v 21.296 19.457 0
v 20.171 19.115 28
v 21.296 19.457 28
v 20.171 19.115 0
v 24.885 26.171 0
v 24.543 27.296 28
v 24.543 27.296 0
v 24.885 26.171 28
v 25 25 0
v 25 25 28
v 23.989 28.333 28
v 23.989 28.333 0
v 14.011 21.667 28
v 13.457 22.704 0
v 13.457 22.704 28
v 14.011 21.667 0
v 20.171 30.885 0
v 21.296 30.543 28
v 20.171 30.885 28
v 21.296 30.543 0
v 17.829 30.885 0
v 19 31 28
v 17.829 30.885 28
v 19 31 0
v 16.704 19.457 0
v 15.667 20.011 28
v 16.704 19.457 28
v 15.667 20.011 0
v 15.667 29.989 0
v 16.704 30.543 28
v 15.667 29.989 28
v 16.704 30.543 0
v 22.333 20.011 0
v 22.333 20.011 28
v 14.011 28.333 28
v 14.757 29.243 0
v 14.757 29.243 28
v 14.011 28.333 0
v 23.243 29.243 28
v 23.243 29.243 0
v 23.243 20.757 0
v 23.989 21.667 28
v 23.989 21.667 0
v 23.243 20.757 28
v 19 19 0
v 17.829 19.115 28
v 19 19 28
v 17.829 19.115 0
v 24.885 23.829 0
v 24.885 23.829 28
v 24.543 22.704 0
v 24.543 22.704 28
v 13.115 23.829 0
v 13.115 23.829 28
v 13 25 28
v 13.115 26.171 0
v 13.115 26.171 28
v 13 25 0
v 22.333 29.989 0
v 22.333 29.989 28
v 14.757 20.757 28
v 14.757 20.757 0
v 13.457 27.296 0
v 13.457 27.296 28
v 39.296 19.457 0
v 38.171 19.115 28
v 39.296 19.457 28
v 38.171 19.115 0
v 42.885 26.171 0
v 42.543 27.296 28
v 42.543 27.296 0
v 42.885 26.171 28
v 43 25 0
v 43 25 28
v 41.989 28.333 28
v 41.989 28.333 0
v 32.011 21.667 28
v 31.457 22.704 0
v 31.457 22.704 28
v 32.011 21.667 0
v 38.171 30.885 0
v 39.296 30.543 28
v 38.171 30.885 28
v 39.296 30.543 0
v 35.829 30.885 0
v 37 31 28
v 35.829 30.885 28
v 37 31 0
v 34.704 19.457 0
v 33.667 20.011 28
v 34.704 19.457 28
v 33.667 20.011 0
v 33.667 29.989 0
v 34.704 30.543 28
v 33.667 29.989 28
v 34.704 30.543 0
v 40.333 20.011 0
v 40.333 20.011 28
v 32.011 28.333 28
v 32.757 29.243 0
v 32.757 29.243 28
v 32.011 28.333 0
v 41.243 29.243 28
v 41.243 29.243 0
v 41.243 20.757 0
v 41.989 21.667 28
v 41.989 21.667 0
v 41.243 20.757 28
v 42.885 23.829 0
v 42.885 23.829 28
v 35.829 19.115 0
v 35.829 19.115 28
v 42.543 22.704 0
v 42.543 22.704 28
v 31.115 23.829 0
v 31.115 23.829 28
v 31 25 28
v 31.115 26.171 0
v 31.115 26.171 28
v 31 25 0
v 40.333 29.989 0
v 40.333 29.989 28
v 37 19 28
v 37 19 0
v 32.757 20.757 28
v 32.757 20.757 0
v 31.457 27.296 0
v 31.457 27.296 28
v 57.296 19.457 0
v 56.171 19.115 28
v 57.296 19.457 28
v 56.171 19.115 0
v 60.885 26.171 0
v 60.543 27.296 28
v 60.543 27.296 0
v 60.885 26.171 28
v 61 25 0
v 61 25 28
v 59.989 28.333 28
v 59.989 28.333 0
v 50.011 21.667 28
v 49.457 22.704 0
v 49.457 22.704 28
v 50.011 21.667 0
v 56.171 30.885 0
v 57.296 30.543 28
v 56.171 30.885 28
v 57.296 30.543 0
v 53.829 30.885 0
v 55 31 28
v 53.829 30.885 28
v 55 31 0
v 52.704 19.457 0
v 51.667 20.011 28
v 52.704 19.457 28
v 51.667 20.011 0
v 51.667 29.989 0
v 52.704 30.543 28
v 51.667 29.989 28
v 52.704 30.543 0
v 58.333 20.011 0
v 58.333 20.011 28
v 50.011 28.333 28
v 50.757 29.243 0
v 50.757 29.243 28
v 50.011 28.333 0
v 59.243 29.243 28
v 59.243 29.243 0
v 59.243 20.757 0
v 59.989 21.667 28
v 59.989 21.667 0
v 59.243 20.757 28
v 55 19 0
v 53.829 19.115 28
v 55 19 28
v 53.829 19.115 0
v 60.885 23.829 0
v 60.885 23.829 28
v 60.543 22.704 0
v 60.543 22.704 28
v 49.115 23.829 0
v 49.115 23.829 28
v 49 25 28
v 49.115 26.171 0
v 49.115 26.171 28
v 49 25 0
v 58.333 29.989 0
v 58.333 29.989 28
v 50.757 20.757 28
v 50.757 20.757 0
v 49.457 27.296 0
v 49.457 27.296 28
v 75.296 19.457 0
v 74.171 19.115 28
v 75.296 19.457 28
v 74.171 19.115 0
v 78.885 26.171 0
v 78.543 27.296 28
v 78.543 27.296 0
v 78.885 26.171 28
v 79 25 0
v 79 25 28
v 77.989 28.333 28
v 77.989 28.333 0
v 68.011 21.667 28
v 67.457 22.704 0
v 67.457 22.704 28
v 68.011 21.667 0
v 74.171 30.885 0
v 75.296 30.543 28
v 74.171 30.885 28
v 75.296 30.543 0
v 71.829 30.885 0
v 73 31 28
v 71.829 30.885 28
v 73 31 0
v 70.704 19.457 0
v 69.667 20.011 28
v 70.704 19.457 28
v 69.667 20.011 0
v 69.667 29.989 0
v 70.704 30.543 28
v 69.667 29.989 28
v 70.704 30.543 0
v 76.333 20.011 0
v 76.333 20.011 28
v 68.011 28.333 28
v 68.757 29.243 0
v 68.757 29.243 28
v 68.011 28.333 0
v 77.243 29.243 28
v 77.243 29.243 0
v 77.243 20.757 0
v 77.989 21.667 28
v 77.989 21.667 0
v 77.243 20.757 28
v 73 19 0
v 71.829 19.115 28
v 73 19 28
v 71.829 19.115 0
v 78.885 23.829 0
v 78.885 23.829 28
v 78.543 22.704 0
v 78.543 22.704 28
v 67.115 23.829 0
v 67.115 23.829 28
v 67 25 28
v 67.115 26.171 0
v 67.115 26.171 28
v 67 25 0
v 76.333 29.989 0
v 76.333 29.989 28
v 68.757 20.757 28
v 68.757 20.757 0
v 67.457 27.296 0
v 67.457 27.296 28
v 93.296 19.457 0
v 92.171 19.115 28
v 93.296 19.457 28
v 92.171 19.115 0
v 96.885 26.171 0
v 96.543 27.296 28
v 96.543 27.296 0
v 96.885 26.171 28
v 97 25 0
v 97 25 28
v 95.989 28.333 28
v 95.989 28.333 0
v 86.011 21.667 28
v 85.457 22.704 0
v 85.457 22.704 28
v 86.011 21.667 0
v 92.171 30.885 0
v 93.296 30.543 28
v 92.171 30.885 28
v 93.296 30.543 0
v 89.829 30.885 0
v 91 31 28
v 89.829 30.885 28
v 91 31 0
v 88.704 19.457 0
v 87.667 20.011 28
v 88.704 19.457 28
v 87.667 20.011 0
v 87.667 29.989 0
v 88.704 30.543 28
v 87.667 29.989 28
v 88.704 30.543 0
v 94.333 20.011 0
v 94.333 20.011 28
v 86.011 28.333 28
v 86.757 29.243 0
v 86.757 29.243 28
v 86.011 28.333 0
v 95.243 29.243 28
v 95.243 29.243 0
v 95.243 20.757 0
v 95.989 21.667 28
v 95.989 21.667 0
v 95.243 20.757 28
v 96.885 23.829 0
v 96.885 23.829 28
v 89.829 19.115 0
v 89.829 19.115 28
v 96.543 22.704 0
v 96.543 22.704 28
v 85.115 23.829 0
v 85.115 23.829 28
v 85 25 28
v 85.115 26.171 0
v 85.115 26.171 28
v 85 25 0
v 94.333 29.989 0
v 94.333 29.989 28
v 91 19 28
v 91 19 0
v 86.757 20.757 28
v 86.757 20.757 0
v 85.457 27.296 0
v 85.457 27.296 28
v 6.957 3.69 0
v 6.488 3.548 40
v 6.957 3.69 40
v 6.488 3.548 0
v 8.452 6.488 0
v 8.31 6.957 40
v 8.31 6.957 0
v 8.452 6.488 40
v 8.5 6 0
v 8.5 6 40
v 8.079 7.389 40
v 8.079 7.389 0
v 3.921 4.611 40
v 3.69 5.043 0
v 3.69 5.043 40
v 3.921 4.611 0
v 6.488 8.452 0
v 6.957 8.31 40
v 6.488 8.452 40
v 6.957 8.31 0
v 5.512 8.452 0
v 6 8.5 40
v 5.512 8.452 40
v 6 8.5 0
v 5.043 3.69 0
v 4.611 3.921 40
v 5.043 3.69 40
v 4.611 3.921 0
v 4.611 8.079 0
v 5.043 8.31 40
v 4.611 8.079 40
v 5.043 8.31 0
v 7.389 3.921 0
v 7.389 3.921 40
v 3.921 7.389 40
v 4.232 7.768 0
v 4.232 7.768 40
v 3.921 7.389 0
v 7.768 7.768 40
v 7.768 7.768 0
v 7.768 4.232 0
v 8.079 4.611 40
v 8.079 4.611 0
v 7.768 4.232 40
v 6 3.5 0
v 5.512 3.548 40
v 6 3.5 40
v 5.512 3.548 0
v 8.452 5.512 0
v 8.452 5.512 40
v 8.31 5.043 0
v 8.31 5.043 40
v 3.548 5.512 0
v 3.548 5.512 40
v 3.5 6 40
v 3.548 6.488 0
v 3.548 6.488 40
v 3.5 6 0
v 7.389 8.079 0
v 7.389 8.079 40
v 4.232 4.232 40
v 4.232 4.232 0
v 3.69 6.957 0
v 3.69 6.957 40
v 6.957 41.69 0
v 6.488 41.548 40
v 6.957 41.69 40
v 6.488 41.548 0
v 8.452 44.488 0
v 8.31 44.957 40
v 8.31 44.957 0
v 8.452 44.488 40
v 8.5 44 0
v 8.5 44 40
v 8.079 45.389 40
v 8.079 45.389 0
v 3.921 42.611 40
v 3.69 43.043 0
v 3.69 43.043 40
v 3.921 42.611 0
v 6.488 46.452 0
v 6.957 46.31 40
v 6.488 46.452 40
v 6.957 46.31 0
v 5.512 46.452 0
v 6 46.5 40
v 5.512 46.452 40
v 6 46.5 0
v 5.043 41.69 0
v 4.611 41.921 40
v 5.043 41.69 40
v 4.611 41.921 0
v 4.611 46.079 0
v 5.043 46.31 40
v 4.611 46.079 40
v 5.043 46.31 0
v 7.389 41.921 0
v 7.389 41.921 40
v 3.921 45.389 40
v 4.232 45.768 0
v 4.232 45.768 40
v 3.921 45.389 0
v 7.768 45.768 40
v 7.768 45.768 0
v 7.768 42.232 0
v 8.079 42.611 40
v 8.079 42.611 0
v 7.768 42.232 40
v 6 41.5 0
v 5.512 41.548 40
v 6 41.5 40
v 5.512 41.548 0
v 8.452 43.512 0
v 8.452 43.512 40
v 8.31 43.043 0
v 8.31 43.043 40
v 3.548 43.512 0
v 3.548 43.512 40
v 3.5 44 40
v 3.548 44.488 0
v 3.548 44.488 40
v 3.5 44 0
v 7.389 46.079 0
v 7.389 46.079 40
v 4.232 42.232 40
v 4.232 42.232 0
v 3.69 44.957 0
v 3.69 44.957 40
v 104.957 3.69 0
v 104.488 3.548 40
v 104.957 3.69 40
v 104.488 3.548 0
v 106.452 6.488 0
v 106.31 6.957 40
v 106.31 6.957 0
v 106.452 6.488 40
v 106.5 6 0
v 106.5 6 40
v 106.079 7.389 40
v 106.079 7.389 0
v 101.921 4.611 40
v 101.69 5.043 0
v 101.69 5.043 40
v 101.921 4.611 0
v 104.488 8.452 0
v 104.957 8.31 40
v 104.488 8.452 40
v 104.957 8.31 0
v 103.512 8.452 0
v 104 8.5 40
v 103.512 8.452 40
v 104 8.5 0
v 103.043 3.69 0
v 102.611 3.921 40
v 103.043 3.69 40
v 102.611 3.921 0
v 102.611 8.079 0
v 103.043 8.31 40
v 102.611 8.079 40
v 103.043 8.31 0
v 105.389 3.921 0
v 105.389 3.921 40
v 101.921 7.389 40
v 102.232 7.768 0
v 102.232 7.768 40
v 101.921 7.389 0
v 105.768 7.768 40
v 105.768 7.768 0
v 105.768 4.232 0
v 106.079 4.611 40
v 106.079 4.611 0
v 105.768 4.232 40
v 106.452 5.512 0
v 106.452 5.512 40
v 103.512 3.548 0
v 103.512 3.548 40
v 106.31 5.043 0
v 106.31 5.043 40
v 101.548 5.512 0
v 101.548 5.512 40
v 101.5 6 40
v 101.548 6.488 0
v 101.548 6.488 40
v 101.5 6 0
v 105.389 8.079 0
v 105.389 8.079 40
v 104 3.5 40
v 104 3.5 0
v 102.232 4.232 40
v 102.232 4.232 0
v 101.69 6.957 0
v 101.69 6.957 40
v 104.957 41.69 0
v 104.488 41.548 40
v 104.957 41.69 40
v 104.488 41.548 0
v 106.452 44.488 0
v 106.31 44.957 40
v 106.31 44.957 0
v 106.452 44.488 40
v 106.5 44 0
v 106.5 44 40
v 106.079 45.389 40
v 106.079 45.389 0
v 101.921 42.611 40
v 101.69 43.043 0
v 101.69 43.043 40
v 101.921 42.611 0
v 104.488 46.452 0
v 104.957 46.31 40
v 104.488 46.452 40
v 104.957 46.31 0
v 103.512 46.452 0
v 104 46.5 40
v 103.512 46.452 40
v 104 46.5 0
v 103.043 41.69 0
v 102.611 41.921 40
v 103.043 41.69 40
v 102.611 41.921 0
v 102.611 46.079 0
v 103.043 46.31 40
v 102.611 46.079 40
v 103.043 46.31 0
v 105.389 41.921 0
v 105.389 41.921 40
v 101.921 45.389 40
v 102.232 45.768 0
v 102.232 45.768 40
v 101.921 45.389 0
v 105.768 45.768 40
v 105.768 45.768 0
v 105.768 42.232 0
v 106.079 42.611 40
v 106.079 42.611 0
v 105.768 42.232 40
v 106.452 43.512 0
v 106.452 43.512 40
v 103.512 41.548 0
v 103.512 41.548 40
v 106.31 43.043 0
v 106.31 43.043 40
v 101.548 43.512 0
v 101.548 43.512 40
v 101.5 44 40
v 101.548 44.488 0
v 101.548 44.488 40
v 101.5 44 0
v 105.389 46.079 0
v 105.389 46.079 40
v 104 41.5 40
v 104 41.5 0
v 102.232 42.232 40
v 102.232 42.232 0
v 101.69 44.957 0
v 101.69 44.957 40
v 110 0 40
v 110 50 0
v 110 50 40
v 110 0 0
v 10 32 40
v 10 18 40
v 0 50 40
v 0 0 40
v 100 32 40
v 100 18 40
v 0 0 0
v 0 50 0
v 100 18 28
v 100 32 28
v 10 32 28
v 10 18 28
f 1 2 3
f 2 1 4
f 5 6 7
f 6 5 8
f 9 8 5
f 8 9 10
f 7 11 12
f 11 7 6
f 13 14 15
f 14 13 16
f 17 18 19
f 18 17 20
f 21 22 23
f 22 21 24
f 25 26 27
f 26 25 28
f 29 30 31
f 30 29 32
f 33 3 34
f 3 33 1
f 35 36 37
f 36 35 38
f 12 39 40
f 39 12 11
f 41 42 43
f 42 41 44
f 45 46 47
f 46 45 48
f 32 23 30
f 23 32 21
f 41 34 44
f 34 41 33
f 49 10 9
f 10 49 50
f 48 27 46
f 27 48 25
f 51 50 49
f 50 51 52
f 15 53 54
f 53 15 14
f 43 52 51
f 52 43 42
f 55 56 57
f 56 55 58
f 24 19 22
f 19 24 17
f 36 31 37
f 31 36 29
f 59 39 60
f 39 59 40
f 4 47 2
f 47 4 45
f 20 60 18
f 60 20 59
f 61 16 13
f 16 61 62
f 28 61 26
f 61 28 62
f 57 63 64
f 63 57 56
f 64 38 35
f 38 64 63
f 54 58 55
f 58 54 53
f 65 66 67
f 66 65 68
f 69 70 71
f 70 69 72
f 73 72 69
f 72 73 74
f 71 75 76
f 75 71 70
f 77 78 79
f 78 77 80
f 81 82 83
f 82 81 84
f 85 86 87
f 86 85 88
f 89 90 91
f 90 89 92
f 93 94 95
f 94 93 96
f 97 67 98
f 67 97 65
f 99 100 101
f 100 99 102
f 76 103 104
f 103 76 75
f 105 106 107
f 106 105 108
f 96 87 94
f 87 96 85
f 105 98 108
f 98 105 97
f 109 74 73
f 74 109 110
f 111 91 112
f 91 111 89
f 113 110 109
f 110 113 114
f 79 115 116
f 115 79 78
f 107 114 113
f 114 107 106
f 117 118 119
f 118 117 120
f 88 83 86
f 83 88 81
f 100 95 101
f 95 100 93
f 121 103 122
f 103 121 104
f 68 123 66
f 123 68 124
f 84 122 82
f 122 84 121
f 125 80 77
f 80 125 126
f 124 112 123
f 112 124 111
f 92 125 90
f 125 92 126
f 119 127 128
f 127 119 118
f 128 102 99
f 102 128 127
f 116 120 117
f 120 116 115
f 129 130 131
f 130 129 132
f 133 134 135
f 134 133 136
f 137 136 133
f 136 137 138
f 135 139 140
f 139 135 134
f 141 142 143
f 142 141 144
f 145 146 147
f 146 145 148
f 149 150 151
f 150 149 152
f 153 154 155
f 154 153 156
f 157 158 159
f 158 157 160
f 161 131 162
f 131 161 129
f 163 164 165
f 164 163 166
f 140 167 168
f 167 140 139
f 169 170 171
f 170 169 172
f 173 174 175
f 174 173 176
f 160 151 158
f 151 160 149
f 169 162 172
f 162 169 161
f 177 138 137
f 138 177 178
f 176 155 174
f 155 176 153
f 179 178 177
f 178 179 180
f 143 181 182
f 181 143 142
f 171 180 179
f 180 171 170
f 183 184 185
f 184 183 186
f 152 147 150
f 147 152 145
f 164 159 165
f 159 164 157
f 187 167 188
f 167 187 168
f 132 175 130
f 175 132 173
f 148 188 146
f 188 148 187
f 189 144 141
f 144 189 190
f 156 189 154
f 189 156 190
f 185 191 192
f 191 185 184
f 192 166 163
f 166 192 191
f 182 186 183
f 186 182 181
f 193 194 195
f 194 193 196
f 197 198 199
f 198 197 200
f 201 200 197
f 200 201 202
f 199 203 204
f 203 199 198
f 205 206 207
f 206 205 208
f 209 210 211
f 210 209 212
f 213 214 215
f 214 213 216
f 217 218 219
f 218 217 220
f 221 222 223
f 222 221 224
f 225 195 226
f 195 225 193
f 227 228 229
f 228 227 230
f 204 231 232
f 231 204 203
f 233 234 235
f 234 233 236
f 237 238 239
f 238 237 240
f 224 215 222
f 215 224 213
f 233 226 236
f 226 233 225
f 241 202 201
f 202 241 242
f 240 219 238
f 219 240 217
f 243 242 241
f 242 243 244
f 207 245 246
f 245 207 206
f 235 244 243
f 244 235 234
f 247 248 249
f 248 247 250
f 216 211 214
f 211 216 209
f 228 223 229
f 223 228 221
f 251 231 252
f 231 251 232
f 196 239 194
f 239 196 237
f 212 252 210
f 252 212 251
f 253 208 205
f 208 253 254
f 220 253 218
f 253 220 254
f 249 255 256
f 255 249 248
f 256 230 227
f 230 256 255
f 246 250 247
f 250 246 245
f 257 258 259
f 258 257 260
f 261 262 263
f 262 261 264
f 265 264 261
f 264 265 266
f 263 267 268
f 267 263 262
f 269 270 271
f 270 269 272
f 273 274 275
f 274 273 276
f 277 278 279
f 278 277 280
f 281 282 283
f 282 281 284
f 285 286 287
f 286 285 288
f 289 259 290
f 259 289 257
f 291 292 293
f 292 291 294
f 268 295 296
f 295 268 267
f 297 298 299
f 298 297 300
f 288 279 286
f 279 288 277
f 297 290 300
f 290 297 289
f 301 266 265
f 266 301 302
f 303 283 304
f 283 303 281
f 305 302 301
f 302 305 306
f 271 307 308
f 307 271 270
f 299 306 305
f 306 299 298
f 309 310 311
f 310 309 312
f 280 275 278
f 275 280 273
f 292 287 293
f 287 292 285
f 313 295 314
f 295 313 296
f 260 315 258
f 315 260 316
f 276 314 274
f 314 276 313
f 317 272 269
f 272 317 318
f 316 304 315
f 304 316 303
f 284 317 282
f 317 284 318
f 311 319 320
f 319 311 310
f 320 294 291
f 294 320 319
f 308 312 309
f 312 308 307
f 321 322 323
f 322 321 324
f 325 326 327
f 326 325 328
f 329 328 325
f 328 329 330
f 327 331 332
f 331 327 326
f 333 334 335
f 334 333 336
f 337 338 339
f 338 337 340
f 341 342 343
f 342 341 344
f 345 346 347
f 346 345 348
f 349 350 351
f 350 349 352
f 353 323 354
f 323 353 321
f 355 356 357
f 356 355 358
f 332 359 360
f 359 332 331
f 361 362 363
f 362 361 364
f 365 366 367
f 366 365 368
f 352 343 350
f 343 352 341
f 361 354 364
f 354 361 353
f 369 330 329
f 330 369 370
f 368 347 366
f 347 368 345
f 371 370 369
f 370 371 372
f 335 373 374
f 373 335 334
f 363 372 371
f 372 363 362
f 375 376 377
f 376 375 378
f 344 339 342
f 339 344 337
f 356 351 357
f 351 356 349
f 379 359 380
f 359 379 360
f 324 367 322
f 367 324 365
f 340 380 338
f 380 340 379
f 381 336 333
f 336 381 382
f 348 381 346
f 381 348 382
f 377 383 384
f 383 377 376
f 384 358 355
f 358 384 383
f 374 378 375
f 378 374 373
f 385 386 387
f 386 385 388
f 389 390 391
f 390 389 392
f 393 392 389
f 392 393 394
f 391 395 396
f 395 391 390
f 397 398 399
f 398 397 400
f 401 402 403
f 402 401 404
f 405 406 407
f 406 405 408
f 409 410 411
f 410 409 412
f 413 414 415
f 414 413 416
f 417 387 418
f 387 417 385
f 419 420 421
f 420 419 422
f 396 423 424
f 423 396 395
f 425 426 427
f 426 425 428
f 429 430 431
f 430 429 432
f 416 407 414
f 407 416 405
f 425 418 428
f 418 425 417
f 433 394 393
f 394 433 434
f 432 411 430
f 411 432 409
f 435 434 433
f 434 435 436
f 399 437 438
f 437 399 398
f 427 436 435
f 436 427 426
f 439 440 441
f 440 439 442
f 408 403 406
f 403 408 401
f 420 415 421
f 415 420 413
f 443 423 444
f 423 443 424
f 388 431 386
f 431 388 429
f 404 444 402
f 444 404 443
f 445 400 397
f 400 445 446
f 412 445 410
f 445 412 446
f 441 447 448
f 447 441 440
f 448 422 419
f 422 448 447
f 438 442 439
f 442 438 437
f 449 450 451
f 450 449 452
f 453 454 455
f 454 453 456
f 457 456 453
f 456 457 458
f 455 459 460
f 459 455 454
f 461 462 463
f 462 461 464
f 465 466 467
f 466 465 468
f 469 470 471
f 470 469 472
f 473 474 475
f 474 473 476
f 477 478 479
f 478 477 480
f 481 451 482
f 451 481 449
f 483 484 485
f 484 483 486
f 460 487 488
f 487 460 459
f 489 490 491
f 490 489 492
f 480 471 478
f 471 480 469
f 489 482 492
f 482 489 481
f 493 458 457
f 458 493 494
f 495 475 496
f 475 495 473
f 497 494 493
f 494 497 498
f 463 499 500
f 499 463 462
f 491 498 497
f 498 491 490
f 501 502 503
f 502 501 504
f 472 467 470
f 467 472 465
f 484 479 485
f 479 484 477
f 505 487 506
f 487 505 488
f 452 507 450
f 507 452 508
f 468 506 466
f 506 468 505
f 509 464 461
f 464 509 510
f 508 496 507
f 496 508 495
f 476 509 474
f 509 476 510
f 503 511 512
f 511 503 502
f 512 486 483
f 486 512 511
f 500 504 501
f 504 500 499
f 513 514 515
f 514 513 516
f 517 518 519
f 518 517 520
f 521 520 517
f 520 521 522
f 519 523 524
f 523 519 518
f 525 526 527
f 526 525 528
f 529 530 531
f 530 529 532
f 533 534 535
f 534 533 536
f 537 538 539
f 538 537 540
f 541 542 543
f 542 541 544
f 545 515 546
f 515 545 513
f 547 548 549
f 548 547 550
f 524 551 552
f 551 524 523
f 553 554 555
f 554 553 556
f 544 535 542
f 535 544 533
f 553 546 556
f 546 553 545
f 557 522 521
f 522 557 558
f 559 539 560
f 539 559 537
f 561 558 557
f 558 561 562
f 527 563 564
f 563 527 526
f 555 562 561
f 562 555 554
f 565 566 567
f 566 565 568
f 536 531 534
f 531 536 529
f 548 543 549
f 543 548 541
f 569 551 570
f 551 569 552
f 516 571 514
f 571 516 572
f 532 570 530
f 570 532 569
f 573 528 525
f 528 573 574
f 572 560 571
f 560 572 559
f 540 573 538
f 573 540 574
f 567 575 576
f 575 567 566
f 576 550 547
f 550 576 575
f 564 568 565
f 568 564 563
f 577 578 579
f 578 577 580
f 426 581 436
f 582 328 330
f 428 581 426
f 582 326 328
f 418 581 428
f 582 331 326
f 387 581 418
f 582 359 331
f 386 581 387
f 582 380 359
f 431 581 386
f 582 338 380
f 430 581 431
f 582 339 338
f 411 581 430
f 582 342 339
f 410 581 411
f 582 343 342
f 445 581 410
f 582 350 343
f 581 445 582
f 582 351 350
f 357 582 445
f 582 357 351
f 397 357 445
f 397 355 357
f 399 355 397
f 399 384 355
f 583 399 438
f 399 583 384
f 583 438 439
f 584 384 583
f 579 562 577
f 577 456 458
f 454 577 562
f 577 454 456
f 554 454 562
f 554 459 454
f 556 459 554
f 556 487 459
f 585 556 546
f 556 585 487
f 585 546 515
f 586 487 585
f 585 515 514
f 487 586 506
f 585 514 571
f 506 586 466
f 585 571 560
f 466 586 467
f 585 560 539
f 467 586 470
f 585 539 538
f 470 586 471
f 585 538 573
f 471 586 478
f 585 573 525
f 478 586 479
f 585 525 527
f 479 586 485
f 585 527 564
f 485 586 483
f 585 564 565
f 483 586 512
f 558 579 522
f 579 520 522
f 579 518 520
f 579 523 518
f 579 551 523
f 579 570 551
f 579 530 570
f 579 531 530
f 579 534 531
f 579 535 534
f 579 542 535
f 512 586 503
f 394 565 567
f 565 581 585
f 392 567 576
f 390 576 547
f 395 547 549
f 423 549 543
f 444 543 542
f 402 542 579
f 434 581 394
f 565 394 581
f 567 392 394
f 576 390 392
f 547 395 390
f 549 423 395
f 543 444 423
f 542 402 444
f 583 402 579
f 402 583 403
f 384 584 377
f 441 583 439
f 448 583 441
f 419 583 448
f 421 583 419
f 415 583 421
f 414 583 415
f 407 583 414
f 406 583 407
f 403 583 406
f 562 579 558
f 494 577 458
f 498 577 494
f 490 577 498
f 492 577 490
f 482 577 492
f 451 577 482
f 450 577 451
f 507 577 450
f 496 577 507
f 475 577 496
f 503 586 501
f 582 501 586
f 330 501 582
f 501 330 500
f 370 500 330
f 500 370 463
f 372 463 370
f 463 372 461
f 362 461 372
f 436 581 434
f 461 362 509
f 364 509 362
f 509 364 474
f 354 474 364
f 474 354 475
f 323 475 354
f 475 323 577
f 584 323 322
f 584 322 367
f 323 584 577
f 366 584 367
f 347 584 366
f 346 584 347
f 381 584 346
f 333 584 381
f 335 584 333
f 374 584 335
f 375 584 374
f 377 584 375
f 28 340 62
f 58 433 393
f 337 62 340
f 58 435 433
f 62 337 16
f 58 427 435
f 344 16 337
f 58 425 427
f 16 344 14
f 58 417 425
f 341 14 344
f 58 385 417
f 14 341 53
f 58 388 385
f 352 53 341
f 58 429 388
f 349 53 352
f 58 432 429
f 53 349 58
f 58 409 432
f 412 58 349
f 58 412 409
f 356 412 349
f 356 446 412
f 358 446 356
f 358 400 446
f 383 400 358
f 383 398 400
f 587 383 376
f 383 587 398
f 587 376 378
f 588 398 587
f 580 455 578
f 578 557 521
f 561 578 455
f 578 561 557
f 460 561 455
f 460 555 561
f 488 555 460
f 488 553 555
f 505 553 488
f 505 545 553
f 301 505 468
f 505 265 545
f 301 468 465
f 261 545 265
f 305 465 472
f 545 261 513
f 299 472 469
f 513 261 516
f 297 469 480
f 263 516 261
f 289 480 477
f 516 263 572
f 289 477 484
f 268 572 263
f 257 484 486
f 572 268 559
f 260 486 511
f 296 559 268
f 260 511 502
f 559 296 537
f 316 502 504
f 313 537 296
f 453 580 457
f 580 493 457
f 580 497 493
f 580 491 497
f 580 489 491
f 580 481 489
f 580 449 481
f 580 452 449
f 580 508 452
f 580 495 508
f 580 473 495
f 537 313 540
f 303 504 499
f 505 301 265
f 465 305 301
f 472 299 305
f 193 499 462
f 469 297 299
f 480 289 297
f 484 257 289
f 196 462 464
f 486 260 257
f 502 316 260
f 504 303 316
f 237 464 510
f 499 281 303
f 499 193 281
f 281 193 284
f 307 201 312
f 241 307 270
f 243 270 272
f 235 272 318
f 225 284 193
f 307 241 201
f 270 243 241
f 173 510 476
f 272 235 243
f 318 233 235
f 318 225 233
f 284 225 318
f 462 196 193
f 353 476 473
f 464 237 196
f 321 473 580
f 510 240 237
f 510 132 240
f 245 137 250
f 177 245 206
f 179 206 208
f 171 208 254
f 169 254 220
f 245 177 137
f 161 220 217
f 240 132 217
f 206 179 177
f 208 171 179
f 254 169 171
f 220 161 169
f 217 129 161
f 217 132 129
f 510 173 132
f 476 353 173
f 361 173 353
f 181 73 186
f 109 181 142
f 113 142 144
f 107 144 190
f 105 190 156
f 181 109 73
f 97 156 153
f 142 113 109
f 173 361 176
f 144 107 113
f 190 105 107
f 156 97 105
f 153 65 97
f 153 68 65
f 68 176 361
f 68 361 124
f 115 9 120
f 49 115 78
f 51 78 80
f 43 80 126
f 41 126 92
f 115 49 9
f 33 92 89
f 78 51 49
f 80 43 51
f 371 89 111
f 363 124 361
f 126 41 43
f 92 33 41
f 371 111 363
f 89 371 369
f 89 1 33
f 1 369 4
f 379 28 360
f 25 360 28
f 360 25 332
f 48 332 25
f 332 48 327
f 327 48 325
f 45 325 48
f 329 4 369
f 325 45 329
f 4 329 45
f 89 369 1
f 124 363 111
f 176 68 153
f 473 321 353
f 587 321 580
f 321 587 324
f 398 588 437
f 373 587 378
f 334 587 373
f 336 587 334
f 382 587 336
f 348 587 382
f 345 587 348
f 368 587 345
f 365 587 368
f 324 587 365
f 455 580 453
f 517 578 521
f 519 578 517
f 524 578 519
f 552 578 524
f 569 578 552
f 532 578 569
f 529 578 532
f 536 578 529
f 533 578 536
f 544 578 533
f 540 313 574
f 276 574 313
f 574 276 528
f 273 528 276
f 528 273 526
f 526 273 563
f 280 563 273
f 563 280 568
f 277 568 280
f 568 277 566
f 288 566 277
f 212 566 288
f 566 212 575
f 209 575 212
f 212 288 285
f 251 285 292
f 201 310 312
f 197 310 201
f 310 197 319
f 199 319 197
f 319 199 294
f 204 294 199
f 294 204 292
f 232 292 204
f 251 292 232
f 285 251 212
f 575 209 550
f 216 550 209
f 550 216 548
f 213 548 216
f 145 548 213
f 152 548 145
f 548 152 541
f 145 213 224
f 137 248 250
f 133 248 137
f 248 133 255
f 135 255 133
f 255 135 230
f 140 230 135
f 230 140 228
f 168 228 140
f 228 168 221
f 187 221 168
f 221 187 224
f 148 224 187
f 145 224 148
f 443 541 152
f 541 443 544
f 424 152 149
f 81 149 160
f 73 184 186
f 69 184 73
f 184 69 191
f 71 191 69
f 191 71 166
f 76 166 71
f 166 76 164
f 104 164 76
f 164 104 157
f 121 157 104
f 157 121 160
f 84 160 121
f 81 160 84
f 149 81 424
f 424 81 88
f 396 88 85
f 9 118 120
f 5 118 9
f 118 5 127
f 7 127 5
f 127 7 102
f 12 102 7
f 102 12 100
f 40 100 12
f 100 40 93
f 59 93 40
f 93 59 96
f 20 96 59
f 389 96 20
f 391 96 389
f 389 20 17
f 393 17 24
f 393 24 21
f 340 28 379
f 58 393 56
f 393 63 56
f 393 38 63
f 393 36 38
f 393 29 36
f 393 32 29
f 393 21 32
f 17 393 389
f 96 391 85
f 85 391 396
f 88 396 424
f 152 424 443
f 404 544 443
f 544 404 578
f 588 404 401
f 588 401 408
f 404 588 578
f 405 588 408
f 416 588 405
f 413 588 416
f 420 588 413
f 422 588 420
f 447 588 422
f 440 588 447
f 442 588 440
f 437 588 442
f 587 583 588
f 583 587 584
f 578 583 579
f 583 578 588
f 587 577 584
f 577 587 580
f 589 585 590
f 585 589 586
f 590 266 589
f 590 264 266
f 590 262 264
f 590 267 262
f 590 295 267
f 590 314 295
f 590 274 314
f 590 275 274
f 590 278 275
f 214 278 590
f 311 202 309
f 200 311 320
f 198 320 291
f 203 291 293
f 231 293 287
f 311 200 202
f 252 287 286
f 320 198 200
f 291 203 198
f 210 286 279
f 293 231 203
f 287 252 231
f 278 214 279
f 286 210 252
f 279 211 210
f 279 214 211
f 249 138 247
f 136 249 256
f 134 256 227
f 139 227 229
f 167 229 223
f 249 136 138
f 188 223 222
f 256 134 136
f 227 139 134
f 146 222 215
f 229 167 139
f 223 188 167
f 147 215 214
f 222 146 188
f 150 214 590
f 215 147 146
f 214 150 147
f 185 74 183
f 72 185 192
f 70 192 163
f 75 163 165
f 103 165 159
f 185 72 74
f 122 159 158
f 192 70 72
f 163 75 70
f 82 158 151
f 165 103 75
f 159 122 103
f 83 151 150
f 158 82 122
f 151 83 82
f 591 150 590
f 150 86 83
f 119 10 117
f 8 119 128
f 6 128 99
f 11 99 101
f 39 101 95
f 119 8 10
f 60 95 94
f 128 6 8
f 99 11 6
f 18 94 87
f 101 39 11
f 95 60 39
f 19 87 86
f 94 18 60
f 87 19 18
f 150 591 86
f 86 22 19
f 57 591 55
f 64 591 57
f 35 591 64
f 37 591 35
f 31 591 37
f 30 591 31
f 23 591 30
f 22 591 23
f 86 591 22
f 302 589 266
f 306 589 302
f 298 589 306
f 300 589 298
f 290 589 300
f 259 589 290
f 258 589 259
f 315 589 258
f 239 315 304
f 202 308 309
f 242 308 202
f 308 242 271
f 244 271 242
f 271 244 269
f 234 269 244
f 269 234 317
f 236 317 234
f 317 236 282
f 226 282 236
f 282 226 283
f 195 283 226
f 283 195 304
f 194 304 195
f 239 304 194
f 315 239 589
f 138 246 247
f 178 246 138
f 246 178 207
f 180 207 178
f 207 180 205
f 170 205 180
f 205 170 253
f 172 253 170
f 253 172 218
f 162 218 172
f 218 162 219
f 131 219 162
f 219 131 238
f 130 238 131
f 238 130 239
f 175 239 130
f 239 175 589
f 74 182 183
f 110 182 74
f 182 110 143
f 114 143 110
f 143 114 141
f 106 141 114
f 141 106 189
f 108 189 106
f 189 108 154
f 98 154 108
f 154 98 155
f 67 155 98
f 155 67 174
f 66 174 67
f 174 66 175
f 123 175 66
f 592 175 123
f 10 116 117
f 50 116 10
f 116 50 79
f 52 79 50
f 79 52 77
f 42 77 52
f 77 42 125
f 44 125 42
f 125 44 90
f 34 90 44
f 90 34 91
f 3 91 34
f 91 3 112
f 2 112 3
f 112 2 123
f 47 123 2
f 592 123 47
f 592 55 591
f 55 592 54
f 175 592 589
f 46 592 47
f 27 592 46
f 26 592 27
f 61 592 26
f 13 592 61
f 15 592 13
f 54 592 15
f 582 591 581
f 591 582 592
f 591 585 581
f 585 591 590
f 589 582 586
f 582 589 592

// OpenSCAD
$fn = 32;

// ----------------------------------------------------------------------
// Manifold block: gallery_top manifold
// ----------------------------------------------------------------------

// --- parameters (mm) ---
block_l = 110;            // block length, X
block_w = 50;             // block width, Y
block_h = 40;             // block height, Z
port_d = 12;              // port bore diameter
port_pitch = 18;          // port pitch along X
gallery_d = 14;           // top gallery width, Y
gallery_depth = 12;       // gallery pocket depth
wall_p = 10;              // gallery end wall thickness, X
mnt_d = 5;                // mounting hole diameter
mnt_in = 6;               // mounting hole inset from the edges

n_ports = 5;  // ports in the row
port_x0 = (block_l - (n_ports - 1) * port_pitch) / 2;  // first port X

difference() {
  cube([block_l, block_w, block_h]);
  for (i = [0 : n_ports - 1])
    translate([port_x0 + i * port_pitch, block_w / 2, -1])
      cylinder(h = block_h + 2, d = port_d);
  translate([wall_p, block_w / 2 - gallery_d / 2, block_h - gallery_depth])
    cube([block_l - 2 * wall_p, gallery_d, gallery_depth + 1]);
  for (cx = [mnt_in, block_l - mnt_in])
    for (cy = [mnt_in, block_w - mnt_in])
      translate([cx, cy, -1]) cylinder(h = block_h + 2, d = mnt_d);
}
